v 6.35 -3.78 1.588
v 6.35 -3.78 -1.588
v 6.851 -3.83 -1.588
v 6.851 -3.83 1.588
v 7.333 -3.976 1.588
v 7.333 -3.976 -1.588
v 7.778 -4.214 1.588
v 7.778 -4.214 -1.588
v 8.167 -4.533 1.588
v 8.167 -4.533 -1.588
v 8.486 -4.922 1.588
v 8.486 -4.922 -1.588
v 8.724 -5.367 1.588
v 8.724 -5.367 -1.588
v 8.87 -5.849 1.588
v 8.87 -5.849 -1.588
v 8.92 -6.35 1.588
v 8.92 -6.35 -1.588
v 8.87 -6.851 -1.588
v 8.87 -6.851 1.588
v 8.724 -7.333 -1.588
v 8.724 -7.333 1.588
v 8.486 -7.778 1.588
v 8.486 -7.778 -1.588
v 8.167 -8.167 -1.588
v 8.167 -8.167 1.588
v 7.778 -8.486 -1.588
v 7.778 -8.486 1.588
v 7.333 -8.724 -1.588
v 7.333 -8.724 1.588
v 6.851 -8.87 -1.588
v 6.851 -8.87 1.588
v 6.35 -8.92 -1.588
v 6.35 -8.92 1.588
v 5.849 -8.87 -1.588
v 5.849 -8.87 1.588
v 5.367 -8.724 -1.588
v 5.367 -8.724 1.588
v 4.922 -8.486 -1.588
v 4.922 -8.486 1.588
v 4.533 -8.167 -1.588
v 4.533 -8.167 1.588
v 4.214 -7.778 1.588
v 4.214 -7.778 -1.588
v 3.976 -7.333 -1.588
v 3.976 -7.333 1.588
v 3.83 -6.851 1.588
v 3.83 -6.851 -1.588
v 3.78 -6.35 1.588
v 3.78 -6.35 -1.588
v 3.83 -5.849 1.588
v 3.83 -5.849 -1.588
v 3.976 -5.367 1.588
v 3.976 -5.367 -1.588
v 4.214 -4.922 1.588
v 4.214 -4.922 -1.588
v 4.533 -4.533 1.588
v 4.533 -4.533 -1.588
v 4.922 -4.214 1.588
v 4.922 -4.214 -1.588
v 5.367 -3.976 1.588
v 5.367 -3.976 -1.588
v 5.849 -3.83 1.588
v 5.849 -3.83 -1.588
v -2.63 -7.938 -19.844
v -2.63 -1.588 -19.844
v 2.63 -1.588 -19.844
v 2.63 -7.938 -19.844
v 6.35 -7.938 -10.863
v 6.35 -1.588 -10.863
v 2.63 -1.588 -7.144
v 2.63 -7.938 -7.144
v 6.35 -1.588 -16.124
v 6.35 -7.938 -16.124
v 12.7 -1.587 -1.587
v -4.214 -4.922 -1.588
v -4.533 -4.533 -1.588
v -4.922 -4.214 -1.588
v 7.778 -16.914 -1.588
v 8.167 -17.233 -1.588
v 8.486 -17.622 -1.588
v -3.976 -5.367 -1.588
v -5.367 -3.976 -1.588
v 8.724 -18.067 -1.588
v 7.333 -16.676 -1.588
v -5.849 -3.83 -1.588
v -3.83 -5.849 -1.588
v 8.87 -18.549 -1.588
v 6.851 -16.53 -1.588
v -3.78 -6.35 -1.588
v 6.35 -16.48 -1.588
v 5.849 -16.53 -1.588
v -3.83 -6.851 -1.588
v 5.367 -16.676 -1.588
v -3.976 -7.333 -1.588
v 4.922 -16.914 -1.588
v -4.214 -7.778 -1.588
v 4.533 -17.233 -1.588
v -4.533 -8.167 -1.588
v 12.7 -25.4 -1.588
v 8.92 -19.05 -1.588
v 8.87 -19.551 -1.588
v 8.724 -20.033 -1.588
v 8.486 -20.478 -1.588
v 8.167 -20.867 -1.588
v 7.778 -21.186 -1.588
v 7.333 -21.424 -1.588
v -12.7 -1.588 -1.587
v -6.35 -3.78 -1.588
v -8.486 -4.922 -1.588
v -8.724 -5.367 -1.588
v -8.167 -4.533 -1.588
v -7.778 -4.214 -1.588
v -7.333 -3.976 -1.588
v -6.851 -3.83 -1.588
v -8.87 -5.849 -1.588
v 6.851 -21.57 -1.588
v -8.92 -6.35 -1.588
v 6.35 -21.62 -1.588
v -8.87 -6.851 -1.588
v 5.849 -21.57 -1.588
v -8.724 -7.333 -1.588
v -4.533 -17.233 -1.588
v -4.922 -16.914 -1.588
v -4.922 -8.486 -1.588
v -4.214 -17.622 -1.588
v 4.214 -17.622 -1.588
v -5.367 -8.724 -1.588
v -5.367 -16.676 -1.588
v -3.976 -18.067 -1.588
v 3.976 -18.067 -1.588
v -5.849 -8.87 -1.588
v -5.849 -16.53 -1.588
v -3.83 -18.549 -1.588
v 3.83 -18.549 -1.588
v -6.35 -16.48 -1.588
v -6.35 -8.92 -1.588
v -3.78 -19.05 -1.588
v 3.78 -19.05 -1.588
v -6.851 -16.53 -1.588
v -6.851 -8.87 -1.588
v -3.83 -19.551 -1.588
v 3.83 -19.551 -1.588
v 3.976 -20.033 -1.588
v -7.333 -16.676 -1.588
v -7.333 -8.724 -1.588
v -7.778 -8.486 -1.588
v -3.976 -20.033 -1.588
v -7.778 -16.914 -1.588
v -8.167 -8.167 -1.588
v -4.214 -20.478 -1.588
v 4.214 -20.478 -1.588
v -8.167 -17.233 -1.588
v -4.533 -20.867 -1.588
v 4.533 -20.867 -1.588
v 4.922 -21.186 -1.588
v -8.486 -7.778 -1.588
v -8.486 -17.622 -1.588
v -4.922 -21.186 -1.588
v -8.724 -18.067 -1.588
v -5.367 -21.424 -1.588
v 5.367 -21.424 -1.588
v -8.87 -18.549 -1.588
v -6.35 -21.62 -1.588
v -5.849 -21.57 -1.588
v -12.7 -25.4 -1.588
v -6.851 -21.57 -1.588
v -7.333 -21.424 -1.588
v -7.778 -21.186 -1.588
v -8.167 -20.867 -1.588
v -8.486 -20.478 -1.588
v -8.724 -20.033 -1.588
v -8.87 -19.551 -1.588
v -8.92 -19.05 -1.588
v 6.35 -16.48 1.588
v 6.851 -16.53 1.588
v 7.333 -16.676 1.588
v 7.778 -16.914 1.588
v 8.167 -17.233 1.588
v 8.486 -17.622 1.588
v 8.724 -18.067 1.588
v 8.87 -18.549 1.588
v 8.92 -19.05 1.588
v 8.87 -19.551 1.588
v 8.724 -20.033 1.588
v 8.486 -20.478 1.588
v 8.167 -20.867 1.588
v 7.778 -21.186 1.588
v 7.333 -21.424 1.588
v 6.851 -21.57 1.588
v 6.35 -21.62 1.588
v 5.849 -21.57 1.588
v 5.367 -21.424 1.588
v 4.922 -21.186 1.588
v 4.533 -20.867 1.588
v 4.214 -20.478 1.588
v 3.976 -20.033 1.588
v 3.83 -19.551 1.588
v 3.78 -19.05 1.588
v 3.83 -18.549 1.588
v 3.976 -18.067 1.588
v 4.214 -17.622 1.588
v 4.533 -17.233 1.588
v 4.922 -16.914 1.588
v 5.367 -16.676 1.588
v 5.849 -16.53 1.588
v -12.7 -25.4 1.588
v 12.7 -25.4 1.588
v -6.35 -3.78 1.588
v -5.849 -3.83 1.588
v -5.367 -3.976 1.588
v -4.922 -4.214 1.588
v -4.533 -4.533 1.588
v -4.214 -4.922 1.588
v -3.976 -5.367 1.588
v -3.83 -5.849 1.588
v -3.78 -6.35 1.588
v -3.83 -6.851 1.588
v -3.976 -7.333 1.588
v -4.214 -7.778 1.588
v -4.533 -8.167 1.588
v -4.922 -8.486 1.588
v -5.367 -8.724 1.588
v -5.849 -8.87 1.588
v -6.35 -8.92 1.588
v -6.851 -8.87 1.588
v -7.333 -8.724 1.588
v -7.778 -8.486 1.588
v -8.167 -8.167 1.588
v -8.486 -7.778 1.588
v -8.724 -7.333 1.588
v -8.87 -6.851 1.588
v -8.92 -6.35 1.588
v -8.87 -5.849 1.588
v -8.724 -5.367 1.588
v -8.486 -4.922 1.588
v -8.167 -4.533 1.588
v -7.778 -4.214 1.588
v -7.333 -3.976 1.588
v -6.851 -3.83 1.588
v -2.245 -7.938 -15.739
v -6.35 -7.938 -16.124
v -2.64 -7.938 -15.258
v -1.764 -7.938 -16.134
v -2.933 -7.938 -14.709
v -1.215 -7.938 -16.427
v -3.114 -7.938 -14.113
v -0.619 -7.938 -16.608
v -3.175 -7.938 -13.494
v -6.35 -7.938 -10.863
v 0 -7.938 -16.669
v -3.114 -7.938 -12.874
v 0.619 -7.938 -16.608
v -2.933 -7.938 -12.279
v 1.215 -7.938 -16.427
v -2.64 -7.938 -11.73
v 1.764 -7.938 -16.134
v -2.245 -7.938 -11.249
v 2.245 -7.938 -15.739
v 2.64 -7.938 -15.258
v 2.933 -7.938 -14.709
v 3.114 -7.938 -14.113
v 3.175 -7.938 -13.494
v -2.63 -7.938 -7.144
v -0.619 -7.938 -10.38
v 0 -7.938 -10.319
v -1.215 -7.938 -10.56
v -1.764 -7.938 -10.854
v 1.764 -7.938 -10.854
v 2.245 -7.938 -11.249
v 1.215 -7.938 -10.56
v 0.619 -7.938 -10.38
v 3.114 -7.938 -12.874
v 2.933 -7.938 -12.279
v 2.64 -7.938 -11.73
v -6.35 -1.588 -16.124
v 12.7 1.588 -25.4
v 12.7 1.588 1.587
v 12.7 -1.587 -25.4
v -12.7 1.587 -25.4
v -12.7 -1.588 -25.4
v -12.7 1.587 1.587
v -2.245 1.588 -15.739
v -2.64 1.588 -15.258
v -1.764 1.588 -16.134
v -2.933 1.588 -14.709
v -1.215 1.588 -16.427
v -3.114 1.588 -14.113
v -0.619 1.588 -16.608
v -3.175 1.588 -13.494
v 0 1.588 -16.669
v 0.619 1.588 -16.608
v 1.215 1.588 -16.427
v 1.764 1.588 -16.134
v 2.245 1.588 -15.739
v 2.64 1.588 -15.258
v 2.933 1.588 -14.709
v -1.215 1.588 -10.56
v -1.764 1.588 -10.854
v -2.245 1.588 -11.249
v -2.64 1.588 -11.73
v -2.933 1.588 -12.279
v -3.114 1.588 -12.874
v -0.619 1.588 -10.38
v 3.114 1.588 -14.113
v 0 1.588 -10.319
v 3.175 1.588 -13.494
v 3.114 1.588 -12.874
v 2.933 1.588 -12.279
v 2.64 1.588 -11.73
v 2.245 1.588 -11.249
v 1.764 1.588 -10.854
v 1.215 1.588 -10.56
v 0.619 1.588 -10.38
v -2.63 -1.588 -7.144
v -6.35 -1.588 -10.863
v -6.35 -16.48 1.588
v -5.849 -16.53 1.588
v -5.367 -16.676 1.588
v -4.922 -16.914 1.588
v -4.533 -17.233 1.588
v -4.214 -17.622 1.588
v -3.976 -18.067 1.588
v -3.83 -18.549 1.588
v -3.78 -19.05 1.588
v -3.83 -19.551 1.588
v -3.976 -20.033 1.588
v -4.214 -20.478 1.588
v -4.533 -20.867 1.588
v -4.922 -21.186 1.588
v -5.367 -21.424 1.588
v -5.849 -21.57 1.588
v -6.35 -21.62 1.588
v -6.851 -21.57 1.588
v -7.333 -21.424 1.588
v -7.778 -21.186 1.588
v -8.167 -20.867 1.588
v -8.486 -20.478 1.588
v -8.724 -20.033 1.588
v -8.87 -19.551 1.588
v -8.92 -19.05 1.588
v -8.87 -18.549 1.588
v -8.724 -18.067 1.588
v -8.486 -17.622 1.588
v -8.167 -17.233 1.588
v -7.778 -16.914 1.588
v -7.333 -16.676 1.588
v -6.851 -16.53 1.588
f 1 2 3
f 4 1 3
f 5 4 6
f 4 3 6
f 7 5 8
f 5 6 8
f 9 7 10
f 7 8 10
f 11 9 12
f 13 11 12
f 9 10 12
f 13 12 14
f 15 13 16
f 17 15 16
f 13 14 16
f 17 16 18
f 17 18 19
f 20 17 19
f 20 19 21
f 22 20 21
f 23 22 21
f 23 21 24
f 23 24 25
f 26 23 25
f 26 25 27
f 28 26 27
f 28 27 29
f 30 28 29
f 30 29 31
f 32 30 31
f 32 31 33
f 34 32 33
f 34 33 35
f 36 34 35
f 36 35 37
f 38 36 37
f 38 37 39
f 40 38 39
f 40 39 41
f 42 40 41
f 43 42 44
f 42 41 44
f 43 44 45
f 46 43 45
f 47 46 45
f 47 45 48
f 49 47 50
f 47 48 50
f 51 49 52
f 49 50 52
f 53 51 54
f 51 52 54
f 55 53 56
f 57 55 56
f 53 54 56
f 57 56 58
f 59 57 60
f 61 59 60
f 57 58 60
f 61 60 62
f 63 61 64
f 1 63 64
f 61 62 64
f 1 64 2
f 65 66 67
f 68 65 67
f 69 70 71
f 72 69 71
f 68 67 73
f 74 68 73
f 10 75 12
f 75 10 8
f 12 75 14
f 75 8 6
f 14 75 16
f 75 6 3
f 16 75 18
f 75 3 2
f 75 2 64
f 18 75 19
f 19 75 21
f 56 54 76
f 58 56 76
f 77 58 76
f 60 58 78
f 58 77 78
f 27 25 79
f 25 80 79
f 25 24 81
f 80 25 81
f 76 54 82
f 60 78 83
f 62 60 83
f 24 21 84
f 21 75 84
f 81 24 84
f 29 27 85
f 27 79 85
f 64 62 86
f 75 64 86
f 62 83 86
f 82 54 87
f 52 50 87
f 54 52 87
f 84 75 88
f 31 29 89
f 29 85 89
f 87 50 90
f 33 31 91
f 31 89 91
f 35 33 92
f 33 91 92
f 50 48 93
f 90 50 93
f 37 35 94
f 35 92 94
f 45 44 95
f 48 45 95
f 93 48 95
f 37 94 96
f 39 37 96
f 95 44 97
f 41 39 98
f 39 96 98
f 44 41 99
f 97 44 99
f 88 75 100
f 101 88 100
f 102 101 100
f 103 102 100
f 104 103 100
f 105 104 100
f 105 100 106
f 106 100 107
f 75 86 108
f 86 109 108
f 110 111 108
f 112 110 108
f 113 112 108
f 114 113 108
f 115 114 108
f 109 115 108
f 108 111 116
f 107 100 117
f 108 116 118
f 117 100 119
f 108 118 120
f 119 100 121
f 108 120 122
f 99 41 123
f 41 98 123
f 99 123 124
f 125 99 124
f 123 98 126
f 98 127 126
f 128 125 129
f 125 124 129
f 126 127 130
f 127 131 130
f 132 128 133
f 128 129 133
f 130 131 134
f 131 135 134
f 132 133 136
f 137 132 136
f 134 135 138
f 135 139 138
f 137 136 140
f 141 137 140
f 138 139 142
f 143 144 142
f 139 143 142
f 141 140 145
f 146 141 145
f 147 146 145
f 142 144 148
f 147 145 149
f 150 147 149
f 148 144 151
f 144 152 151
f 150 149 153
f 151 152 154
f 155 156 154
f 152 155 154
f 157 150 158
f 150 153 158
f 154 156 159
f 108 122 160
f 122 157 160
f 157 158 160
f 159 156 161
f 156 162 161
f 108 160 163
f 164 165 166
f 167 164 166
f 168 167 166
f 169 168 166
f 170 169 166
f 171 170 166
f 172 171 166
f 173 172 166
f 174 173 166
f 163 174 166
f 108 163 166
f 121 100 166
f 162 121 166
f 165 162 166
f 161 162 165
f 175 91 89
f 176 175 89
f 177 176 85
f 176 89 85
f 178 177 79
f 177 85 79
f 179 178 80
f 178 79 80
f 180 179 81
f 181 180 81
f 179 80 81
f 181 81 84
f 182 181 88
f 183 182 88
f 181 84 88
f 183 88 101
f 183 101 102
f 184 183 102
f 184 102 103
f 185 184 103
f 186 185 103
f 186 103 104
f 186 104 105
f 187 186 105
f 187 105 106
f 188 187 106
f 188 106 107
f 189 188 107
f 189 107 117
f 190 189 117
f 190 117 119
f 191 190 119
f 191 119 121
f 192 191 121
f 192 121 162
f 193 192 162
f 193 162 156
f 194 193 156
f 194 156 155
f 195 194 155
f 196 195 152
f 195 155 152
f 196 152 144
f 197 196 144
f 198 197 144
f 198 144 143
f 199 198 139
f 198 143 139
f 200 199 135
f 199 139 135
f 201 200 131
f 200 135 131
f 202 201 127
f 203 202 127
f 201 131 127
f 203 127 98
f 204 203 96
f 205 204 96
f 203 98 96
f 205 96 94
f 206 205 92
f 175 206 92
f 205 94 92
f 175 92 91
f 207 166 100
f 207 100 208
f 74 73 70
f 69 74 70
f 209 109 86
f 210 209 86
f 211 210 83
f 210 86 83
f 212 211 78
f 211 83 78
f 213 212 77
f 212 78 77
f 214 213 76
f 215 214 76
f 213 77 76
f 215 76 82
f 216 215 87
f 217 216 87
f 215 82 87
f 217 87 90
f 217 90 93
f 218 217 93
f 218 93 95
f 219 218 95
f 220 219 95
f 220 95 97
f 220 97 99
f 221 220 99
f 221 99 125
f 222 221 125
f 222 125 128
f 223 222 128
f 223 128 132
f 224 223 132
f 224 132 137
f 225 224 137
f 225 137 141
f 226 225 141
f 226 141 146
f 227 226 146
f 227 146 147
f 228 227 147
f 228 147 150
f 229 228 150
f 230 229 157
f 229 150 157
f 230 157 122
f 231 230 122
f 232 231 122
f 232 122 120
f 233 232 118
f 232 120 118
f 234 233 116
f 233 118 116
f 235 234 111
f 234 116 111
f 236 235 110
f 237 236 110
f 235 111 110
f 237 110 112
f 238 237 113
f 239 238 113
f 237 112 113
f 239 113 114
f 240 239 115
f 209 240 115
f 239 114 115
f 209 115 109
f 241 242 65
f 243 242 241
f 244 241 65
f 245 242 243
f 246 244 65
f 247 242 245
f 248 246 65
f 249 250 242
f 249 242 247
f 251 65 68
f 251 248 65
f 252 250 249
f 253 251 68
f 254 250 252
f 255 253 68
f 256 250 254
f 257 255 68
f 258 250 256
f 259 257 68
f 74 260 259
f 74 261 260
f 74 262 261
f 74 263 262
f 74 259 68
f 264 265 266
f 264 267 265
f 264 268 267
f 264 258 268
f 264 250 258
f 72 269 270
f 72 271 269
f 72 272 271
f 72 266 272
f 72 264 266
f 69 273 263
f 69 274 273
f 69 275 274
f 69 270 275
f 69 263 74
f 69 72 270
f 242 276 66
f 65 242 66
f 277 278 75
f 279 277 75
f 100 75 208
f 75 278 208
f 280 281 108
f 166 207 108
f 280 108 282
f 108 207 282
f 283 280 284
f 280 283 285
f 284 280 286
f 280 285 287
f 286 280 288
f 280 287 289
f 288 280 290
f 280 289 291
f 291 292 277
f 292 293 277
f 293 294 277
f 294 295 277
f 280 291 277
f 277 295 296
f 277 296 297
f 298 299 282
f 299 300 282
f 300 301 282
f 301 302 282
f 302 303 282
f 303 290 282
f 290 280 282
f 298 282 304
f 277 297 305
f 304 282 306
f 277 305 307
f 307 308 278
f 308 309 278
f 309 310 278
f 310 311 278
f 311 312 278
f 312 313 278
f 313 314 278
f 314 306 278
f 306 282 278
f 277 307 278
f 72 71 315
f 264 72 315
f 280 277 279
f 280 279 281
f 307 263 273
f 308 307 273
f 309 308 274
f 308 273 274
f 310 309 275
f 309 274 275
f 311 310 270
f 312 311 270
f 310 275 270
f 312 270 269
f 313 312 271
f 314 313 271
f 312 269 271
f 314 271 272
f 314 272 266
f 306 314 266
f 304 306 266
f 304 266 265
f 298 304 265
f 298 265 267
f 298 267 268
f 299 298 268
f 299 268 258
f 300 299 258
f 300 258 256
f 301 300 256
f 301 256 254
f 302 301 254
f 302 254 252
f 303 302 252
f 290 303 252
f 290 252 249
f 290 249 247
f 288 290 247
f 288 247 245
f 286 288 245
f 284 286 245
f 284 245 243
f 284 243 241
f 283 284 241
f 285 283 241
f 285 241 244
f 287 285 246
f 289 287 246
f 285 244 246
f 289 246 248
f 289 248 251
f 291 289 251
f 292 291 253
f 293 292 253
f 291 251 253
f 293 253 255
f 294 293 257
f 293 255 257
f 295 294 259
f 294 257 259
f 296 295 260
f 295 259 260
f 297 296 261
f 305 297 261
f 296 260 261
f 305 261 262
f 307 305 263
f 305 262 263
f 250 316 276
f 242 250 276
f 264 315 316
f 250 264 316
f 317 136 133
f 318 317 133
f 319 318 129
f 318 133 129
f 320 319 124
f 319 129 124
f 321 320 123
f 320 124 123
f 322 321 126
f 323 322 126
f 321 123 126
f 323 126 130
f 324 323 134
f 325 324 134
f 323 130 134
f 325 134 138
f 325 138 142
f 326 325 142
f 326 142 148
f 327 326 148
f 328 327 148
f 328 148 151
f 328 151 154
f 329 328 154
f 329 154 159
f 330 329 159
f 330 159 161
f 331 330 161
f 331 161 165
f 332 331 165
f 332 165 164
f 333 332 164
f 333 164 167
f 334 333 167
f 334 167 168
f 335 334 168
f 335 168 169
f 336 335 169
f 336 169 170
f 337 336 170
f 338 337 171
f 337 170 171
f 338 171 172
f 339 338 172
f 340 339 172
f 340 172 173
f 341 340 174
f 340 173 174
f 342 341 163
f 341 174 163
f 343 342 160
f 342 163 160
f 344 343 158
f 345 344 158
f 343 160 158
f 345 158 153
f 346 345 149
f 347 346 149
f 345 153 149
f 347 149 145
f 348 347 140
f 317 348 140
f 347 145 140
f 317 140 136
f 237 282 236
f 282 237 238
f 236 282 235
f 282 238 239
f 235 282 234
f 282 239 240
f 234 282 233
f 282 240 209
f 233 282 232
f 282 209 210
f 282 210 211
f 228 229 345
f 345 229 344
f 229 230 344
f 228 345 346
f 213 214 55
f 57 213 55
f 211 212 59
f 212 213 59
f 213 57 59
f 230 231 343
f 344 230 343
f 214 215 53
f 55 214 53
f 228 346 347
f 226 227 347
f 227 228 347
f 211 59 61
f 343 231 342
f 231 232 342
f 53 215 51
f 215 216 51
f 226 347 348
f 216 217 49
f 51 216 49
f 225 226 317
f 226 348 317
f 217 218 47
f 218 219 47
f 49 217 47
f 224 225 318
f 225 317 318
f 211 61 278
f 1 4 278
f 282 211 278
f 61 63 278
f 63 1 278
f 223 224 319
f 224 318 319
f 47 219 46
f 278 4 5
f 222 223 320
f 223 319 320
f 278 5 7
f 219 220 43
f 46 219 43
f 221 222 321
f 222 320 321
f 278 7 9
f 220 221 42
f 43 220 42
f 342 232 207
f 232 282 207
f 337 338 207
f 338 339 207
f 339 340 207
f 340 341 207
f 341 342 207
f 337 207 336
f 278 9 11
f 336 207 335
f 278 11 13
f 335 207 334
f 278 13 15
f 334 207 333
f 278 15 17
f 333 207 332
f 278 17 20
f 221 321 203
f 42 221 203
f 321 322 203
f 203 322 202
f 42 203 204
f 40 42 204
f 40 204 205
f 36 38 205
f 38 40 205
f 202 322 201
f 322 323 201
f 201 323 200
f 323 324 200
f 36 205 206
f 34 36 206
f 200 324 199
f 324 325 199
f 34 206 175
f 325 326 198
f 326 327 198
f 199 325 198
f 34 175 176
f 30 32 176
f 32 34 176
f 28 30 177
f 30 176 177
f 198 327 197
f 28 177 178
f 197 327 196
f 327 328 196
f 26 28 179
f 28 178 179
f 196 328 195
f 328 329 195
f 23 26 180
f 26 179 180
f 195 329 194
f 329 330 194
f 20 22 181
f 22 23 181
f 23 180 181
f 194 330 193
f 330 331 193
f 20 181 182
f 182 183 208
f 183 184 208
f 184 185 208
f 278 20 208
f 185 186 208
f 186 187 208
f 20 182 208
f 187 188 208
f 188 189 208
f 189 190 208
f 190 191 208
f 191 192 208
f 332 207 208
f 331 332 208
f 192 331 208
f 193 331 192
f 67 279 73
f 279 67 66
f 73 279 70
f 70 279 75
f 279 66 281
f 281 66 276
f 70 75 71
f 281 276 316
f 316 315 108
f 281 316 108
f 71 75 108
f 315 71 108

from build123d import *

# Parameters (mm, degrees)
ESQUISSE2_W             = 25.4
ESQUISSE2_H             = 3.175
BOSS_EXTRU_1_DEPTH      = 6.35
ESQUISSE5_R             = 3.175
ENL_V_MAT_EXTRU_1_DEPTH = 34.3375
ESQUISSE7_R             = 2.569510145
ENL_V_MAT_EXTRU_2_DEPTH = 38.060560658


with BuildPart() as part:
    # Balayage1: sweep along a path in Esquisse1
    with BuildLine(Plane(origin=(0, 0, 0), x_dir=(0, 0, -1), z_dir=(1, 0, 0))) as balayage1_path:
        Line((25.4, 0), (0, 0))
        Line((0, 0), (0, -25.4))
    # Esquisse2 → Balayage1 (sweep)
    with BuildSketch(Plane(origin=(0, -25.4, 0), x_dir=(-1, 0, 0), z_dir=(0, 1, 0))):
        Rectangle(ESQUISSE2_W, ESQUISSE2_H)
    sweep(path=balayage1_path.line, transition=Transition.RIGHT)

    # Esquisse3 → Boss.-Extru.1 (add)
    with BuildSketch(Plane.XZ.offset(1.5875)):
        Polygon((2.630256121, -19.84375), (6.35, -16.124006121), (6.35, -10.863493879), (2.630256121, -7.14375), (-2.630256121, -7.14375), (-6.35, -10.863493879), (-6.35, -16.124006121), (-2.630256121, -19.84375), align=None)
    extrude(amount=BOSS_EXTRU_1_DEPTH)

    # Esquisse5 → Enlèv. mat.-Extru.1 (cut, through all)
    with BuildSketch(Plane.XZ.offset(7.9375)):
        with Locations((0, -13.49375)):
            Circle(ESQUISSE5_R)
    extrude(amount=-ENL_V_MAT_EXTRU_1_DEPTH, mode=Mode.SUBTRACT)

    # Esquisse7 → Enlèv. mat.-Extru.2 (cut, through all)
    with BuildSketch(Plane(origin=(0, 0, -1.5875), x_dir=(-1, 0, 0), z_dir=(0, 0, -1))):
        with Locations(Location((-6.35, -19.05, 0), (0, 0, 90))):
            Circle(ESQUISSE7_R)
        with Locations(Location((-6.35, -6.35, 0), (0, 0, 90))):
            Circle(ESQUISSE7_R)
        with Locations(Location((6.35, -19.05, 0), (0, 0, 90))):
            Circle(ESQUISSE7_R)
        with Locations(Location((6.35, -6.35, 0), (0, 0, 90))):
            Circle(ESQUISSE7_R)
    extrude(amount=-ENL_V_MAT_EXTRU_2_DEPTH, mode=Mode.SUBTRACT)


solid = part.part
